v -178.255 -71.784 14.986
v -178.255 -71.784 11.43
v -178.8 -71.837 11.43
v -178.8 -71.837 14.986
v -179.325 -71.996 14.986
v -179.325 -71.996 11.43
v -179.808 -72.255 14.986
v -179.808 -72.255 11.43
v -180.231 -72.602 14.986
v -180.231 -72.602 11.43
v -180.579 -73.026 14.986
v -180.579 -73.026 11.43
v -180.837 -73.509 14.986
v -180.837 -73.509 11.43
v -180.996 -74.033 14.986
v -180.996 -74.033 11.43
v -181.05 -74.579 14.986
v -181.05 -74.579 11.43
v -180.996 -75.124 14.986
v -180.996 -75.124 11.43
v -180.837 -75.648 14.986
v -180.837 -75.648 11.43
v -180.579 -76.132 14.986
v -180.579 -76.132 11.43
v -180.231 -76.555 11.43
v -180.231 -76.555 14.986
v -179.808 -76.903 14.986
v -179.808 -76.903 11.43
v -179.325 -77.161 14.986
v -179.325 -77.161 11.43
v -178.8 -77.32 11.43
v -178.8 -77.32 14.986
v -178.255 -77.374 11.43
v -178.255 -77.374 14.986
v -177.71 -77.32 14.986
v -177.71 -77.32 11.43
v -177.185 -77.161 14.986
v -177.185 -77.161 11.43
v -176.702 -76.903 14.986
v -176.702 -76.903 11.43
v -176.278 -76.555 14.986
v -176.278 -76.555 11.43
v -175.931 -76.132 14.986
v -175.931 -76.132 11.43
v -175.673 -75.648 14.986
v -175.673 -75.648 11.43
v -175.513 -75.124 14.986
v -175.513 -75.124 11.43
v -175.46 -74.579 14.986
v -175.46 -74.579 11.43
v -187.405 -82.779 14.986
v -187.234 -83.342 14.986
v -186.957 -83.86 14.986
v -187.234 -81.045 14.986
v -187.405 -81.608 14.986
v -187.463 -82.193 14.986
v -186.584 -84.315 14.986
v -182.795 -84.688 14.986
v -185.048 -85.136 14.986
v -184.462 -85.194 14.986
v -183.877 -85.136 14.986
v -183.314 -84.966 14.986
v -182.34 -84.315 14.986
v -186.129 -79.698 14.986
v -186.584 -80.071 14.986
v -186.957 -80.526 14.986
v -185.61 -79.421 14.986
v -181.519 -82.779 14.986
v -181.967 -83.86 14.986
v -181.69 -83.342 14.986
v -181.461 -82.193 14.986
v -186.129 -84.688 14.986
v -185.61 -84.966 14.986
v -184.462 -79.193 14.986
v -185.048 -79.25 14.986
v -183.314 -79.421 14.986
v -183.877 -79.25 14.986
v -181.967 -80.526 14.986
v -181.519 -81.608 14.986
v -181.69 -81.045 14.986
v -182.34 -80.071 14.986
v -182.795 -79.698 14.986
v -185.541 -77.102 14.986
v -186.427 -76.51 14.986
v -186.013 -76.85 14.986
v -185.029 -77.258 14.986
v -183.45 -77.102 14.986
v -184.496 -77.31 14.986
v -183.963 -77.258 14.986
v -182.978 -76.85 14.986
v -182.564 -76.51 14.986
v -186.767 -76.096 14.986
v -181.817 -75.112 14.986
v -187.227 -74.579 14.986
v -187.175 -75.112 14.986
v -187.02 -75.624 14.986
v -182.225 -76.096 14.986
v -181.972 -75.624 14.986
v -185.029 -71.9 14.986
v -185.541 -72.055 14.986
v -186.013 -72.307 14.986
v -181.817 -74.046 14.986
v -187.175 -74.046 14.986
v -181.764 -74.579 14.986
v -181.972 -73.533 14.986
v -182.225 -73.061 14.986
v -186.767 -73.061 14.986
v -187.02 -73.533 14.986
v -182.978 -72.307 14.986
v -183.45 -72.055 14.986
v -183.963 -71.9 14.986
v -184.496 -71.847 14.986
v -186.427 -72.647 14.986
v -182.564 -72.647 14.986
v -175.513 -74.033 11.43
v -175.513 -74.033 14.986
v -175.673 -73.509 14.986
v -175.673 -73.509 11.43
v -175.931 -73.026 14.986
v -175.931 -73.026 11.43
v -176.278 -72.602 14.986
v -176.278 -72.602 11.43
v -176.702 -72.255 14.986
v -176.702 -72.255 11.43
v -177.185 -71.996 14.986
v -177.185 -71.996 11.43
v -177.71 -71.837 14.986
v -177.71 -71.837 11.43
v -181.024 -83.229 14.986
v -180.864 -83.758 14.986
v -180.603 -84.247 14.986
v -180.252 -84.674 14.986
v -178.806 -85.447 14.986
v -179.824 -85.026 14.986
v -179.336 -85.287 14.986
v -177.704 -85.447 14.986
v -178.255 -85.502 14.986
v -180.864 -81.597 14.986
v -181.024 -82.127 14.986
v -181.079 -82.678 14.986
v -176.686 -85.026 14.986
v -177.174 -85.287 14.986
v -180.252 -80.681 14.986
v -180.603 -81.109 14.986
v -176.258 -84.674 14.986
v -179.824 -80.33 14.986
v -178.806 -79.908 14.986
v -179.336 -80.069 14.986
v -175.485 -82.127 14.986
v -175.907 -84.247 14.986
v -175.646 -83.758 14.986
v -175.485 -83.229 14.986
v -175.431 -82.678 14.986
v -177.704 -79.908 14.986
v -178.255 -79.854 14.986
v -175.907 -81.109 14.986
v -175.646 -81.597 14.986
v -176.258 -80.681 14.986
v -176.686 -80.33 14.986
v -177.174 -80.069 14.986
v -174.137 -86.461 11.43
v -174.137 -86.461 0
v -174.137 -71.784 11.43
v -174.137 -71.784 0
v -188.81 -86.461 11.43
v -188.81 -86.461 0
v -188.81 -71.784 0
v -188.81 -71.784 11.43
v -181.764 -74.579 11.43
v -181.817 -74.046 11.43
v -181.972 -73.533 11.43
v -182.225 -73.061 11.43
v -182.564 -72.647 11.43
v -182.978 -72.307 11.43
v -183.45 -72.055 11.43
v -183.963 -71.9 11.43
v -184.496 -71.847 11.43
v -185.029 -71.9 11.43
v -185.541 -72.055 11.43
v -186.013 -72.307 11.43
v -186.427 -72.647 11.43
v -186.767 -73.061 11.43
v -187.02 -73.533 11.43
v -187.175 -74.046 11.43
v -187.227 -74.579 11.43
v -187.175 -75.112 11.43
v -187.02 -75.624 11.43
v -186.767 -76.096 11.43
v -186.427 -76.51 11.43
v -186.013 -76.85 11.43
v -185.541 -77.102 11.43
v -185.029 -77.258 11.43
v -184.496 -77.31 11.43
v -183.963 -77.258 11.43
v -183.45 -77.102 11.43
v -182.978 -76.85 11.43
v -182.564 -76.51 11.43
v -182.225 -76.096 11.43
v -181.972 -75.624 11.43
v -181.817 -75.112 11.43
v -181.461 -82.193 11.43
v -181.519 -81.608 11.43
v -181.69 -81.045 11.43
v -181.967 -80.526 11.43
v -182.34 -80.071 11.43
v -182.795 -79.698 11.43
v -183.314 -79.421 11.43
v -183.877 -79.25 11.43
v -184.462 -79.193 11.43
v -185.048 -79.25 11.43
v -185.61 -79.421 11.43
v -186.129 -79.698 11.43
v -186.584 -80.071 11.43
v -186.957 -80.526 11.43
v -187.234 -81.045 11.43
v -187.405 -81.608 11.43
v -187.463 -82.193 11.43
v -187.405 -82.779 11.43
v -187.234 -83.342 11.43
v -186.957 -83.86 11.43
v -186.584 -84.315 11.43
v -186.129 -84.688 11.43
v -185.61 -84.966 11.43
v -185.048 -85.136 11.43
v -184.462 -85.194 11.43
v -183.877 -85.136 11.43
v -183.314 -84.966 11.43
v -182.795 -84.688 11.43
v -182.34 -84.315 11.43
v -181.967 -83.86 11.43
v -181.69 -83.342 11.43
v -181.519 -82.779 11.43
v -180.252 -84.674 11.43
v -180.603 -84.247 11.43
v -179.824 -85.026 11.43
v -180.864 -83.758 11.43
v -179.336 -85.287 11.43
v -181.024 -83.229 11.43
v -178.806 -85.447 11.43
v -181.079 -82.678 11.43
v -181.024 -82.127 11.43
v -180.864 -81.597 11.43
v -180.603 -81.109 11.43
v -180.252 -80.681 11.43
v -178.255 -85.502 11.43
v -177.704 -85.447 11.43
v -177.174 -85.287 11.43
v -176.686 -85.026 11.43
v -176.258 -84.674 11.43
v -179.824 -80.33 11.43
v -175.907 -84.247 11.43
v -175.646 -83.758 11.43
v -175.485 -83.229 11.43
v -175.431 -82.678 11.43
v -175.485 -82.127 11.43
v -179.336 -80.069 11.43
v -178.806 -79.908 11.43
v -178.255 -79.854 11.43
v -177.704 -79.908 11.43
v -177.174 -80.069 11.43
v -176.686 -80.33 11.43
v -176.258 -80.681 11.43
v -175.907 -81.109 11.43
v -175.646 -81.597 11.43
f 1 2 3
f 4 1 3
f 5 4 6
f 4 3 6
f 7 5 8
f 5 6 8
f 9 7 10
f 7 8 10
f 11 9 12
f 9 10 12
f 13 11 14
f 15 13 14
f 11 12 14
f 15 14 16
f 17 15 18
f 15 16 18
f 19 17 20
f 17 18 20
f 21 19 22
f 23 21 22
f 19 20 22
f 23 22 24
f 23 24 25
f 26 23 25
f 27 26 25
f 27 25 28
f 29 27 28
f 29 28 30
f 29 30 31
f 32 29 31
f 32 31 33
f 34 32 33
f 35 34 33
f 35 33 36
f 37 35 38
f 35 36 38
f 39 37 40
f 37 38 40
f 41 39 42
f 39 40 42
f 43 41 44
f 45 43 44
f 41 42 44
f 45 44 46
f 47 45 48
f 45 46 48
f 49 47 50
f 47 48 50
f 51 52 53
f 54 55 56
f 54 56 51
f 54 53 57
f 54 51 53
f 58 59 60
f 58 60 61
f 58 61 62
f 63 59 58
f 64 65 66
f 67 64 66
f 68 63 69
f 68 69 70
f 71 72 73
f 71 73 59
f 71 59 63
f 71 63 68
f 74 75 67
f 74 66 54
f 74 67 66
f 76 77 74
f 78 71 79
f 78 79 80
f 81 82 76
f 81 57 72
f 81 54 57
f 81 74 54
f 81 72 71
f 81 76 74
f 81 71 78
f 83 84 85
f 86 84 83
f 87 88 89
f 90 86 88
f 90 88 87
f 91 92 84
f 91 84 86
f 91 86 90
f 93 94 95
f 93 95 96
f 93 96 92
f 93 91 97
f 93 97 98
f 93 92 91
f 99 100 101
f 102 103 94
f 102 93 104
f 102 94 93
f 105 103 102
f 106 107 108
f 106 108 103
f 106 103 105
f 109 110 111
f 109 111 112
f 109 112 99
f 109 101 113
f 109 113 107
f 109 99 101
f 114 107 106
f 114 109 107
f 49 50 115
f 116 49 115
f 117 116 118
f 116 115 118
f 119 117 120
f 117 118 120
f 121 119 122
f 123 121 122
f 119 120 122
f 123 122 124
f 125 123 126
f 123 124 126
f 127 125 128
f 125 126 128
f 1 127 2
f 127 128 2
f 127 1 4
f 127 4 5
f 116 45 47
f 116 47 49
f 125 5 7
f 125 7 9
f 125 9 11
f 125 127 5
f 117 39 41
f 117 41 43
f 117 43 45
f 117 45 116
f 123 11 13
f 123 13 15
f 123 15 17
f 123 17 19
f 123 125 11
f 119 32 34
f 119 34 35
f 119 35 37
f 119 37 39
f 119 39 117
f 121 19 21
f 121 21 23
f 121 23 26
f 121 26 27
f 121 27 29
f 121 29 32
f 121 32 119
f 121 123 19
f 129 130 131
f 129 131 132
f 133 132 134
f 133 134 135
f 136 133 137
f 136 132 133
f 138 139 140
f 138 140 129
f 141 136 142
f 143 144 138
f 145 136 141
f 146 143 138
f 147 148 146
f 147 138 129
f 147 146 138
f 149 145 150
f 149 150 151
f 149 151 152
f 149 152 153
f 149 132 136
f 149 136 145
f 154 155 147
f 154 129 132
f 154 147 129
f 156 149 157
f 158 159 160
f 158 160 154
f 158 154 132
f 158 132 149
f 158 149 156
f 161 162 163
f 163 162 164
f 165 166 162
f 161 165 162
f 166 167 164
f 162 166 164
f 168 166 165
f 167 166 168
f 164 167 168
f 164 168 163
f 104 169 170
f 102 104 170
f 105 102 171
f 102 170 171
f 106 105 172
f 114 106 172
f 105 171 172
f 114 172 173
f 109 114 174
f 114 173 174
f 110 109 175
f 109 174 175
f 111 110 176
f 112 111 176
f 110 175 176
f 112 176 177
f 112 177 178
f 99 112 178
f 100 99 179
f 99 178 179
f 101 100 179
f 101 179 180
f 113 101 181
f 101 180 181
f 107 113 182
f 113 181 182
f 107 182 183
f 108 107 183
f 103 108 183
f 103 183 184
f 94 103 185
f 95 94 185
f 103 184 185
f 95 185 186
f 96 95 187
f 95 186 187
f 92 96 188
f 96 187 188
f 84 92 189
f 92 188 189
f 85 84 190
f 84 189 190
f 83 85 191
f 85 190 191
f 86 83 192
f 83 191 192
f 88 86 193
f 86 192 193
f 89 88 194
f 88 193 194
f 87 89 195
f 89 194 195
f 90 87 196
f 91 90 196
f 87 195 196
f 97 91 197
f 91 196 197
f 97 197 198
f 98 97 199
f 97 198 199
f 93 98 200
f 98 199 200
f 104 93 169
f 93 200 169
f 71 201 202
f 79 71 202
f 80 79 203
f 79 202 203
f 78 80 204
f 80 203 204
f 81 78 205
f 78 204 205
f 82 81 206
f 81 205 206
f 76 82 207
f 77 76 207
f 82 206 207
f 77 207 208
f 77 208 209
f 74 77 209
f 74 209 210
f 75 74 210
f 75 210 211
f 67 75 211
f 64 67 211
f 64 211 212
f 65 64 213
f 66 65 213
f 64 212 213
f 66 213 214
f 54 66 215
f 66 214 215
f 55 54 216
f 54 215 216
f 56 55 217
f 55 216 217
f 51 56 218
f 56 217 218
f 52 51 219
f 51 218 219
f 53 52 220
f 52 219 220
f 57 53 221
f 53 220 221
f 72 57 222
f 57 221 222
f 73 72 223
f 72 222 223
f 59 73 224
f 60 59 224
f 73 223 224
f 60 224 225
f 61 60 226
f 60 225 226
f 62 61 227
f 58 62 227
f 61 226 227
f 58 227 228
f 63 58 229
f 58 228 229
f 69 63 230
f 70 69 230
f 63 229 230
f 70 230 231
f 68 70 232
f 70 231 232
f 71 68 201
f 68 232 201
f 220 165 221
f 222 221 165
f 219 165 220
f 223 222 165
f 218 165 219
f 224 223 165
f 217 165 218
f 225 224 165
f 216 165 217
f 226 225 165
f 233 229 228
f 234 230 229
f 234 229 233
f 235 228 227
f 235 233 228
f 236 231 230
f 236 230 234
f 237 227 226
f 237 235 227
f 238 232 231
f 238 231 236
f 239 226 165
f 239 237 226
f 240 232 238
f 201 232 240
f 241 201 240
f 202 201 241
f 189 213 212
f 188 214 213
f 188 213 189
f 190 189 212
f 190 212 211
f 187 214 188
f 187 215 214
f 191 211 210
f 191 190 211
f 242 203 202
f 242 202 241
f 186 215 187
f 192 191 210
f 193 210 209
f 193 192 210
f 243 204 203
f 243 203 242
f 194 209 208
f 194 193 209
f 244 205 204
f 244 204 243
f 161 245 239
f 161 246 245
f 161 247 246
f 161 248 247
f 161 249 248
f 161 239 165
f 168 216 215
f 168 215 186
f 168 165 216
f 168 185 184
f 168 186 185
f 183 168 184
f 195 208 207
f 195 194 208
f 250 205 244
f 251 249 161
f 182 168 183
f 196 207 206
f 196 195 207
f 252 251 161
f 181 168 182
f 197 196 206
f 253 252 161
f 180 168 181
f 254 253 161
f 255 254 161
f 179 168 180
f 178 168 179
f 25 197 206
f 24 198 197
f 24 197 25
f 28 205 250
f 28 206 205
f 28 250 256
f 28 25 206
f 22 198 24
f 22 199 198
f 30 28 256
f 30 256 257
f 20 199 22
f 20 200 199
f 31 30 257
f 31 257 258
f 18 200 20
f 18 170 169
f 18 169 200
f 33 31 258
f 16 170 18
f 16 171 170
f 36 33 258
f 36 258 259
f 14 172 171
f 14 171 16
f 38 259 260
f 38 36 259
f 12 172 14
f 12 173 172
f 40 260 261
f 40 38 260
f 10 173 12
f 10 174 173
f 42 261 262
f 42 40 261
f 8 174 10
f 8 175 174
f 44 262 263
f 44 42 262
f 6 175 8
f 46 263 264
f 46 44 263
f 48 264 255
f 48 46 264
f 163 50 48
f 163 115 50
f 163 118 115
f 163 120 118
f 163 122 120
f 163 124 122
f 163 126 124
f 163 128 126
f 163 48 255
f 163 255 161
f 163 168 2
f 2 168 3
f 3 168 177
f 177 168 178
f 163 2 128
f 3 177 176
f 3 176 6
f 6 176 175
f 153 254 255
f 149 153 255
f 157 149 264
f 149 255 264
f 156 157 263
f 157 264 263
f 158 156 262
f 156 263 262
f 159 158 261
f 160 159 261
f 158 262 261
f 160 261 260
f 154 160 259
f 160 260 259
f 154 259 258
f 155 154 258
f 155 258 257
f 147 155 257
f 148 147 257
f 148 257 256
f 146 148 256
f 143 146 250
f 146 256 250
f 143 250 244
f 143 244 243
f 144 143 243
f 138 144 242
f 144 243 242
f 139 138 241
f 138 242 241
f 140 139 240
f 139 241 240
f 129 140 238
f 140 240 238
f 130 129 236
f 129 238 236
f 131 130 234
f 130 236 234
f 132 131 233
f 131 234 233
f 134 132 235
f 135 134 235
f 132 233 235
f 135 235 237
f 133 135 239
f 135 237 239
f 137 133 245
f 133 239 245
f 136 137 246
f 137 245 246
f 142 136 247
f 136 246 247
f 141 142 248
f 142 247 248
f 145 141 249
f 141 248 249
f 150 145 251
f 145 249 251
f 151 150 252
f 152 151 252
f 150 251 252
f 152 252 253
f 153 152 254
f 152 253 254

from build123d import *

# Parameters (mm, degrees)
F1_W     = 14.673665
F1_H     = 14.677159
F2_DEPTH = 11.43
F3_R     = 2.823757
F3_R_2   = 2.731621
F3_R_3   = 3.000674
F5_DEPTH = 3.556


with BuildPart() as f2:
    # F1 (on face) → F2 (new body)
    with BuildSketch(Plane.XY):
        with Locations((-181.473411, -79.122174)):
            Rectangle(F1_W, F1_H)
    extrude(amount=F2_DEPTH)

    # F3 (on face) → F5 (join)
    with BuildSketch(Plane.XY.offset(11.43)):
        with BuildLine():
            ThreePointArc((-178.254932, -71.783595), (-180.231409, -76.555231), (-175.459772, -74.578755))
            ThreePointArc((-175.459772, -74.578755), (-176.278456, -72.602278), (-178.254932, -71.783595))
        make_face()
        with Locations((-178.254932, -82.677774)):
            Circle(F3_R)
        with Locations((-184.495822, -74.578755)):
            Circle(F3_R_2)
        with Locations((-184.46213, -82.193248)):
            Circle(F3_R_3)
    extrude(amount=F5_DEPTH)


solid = f2.part
